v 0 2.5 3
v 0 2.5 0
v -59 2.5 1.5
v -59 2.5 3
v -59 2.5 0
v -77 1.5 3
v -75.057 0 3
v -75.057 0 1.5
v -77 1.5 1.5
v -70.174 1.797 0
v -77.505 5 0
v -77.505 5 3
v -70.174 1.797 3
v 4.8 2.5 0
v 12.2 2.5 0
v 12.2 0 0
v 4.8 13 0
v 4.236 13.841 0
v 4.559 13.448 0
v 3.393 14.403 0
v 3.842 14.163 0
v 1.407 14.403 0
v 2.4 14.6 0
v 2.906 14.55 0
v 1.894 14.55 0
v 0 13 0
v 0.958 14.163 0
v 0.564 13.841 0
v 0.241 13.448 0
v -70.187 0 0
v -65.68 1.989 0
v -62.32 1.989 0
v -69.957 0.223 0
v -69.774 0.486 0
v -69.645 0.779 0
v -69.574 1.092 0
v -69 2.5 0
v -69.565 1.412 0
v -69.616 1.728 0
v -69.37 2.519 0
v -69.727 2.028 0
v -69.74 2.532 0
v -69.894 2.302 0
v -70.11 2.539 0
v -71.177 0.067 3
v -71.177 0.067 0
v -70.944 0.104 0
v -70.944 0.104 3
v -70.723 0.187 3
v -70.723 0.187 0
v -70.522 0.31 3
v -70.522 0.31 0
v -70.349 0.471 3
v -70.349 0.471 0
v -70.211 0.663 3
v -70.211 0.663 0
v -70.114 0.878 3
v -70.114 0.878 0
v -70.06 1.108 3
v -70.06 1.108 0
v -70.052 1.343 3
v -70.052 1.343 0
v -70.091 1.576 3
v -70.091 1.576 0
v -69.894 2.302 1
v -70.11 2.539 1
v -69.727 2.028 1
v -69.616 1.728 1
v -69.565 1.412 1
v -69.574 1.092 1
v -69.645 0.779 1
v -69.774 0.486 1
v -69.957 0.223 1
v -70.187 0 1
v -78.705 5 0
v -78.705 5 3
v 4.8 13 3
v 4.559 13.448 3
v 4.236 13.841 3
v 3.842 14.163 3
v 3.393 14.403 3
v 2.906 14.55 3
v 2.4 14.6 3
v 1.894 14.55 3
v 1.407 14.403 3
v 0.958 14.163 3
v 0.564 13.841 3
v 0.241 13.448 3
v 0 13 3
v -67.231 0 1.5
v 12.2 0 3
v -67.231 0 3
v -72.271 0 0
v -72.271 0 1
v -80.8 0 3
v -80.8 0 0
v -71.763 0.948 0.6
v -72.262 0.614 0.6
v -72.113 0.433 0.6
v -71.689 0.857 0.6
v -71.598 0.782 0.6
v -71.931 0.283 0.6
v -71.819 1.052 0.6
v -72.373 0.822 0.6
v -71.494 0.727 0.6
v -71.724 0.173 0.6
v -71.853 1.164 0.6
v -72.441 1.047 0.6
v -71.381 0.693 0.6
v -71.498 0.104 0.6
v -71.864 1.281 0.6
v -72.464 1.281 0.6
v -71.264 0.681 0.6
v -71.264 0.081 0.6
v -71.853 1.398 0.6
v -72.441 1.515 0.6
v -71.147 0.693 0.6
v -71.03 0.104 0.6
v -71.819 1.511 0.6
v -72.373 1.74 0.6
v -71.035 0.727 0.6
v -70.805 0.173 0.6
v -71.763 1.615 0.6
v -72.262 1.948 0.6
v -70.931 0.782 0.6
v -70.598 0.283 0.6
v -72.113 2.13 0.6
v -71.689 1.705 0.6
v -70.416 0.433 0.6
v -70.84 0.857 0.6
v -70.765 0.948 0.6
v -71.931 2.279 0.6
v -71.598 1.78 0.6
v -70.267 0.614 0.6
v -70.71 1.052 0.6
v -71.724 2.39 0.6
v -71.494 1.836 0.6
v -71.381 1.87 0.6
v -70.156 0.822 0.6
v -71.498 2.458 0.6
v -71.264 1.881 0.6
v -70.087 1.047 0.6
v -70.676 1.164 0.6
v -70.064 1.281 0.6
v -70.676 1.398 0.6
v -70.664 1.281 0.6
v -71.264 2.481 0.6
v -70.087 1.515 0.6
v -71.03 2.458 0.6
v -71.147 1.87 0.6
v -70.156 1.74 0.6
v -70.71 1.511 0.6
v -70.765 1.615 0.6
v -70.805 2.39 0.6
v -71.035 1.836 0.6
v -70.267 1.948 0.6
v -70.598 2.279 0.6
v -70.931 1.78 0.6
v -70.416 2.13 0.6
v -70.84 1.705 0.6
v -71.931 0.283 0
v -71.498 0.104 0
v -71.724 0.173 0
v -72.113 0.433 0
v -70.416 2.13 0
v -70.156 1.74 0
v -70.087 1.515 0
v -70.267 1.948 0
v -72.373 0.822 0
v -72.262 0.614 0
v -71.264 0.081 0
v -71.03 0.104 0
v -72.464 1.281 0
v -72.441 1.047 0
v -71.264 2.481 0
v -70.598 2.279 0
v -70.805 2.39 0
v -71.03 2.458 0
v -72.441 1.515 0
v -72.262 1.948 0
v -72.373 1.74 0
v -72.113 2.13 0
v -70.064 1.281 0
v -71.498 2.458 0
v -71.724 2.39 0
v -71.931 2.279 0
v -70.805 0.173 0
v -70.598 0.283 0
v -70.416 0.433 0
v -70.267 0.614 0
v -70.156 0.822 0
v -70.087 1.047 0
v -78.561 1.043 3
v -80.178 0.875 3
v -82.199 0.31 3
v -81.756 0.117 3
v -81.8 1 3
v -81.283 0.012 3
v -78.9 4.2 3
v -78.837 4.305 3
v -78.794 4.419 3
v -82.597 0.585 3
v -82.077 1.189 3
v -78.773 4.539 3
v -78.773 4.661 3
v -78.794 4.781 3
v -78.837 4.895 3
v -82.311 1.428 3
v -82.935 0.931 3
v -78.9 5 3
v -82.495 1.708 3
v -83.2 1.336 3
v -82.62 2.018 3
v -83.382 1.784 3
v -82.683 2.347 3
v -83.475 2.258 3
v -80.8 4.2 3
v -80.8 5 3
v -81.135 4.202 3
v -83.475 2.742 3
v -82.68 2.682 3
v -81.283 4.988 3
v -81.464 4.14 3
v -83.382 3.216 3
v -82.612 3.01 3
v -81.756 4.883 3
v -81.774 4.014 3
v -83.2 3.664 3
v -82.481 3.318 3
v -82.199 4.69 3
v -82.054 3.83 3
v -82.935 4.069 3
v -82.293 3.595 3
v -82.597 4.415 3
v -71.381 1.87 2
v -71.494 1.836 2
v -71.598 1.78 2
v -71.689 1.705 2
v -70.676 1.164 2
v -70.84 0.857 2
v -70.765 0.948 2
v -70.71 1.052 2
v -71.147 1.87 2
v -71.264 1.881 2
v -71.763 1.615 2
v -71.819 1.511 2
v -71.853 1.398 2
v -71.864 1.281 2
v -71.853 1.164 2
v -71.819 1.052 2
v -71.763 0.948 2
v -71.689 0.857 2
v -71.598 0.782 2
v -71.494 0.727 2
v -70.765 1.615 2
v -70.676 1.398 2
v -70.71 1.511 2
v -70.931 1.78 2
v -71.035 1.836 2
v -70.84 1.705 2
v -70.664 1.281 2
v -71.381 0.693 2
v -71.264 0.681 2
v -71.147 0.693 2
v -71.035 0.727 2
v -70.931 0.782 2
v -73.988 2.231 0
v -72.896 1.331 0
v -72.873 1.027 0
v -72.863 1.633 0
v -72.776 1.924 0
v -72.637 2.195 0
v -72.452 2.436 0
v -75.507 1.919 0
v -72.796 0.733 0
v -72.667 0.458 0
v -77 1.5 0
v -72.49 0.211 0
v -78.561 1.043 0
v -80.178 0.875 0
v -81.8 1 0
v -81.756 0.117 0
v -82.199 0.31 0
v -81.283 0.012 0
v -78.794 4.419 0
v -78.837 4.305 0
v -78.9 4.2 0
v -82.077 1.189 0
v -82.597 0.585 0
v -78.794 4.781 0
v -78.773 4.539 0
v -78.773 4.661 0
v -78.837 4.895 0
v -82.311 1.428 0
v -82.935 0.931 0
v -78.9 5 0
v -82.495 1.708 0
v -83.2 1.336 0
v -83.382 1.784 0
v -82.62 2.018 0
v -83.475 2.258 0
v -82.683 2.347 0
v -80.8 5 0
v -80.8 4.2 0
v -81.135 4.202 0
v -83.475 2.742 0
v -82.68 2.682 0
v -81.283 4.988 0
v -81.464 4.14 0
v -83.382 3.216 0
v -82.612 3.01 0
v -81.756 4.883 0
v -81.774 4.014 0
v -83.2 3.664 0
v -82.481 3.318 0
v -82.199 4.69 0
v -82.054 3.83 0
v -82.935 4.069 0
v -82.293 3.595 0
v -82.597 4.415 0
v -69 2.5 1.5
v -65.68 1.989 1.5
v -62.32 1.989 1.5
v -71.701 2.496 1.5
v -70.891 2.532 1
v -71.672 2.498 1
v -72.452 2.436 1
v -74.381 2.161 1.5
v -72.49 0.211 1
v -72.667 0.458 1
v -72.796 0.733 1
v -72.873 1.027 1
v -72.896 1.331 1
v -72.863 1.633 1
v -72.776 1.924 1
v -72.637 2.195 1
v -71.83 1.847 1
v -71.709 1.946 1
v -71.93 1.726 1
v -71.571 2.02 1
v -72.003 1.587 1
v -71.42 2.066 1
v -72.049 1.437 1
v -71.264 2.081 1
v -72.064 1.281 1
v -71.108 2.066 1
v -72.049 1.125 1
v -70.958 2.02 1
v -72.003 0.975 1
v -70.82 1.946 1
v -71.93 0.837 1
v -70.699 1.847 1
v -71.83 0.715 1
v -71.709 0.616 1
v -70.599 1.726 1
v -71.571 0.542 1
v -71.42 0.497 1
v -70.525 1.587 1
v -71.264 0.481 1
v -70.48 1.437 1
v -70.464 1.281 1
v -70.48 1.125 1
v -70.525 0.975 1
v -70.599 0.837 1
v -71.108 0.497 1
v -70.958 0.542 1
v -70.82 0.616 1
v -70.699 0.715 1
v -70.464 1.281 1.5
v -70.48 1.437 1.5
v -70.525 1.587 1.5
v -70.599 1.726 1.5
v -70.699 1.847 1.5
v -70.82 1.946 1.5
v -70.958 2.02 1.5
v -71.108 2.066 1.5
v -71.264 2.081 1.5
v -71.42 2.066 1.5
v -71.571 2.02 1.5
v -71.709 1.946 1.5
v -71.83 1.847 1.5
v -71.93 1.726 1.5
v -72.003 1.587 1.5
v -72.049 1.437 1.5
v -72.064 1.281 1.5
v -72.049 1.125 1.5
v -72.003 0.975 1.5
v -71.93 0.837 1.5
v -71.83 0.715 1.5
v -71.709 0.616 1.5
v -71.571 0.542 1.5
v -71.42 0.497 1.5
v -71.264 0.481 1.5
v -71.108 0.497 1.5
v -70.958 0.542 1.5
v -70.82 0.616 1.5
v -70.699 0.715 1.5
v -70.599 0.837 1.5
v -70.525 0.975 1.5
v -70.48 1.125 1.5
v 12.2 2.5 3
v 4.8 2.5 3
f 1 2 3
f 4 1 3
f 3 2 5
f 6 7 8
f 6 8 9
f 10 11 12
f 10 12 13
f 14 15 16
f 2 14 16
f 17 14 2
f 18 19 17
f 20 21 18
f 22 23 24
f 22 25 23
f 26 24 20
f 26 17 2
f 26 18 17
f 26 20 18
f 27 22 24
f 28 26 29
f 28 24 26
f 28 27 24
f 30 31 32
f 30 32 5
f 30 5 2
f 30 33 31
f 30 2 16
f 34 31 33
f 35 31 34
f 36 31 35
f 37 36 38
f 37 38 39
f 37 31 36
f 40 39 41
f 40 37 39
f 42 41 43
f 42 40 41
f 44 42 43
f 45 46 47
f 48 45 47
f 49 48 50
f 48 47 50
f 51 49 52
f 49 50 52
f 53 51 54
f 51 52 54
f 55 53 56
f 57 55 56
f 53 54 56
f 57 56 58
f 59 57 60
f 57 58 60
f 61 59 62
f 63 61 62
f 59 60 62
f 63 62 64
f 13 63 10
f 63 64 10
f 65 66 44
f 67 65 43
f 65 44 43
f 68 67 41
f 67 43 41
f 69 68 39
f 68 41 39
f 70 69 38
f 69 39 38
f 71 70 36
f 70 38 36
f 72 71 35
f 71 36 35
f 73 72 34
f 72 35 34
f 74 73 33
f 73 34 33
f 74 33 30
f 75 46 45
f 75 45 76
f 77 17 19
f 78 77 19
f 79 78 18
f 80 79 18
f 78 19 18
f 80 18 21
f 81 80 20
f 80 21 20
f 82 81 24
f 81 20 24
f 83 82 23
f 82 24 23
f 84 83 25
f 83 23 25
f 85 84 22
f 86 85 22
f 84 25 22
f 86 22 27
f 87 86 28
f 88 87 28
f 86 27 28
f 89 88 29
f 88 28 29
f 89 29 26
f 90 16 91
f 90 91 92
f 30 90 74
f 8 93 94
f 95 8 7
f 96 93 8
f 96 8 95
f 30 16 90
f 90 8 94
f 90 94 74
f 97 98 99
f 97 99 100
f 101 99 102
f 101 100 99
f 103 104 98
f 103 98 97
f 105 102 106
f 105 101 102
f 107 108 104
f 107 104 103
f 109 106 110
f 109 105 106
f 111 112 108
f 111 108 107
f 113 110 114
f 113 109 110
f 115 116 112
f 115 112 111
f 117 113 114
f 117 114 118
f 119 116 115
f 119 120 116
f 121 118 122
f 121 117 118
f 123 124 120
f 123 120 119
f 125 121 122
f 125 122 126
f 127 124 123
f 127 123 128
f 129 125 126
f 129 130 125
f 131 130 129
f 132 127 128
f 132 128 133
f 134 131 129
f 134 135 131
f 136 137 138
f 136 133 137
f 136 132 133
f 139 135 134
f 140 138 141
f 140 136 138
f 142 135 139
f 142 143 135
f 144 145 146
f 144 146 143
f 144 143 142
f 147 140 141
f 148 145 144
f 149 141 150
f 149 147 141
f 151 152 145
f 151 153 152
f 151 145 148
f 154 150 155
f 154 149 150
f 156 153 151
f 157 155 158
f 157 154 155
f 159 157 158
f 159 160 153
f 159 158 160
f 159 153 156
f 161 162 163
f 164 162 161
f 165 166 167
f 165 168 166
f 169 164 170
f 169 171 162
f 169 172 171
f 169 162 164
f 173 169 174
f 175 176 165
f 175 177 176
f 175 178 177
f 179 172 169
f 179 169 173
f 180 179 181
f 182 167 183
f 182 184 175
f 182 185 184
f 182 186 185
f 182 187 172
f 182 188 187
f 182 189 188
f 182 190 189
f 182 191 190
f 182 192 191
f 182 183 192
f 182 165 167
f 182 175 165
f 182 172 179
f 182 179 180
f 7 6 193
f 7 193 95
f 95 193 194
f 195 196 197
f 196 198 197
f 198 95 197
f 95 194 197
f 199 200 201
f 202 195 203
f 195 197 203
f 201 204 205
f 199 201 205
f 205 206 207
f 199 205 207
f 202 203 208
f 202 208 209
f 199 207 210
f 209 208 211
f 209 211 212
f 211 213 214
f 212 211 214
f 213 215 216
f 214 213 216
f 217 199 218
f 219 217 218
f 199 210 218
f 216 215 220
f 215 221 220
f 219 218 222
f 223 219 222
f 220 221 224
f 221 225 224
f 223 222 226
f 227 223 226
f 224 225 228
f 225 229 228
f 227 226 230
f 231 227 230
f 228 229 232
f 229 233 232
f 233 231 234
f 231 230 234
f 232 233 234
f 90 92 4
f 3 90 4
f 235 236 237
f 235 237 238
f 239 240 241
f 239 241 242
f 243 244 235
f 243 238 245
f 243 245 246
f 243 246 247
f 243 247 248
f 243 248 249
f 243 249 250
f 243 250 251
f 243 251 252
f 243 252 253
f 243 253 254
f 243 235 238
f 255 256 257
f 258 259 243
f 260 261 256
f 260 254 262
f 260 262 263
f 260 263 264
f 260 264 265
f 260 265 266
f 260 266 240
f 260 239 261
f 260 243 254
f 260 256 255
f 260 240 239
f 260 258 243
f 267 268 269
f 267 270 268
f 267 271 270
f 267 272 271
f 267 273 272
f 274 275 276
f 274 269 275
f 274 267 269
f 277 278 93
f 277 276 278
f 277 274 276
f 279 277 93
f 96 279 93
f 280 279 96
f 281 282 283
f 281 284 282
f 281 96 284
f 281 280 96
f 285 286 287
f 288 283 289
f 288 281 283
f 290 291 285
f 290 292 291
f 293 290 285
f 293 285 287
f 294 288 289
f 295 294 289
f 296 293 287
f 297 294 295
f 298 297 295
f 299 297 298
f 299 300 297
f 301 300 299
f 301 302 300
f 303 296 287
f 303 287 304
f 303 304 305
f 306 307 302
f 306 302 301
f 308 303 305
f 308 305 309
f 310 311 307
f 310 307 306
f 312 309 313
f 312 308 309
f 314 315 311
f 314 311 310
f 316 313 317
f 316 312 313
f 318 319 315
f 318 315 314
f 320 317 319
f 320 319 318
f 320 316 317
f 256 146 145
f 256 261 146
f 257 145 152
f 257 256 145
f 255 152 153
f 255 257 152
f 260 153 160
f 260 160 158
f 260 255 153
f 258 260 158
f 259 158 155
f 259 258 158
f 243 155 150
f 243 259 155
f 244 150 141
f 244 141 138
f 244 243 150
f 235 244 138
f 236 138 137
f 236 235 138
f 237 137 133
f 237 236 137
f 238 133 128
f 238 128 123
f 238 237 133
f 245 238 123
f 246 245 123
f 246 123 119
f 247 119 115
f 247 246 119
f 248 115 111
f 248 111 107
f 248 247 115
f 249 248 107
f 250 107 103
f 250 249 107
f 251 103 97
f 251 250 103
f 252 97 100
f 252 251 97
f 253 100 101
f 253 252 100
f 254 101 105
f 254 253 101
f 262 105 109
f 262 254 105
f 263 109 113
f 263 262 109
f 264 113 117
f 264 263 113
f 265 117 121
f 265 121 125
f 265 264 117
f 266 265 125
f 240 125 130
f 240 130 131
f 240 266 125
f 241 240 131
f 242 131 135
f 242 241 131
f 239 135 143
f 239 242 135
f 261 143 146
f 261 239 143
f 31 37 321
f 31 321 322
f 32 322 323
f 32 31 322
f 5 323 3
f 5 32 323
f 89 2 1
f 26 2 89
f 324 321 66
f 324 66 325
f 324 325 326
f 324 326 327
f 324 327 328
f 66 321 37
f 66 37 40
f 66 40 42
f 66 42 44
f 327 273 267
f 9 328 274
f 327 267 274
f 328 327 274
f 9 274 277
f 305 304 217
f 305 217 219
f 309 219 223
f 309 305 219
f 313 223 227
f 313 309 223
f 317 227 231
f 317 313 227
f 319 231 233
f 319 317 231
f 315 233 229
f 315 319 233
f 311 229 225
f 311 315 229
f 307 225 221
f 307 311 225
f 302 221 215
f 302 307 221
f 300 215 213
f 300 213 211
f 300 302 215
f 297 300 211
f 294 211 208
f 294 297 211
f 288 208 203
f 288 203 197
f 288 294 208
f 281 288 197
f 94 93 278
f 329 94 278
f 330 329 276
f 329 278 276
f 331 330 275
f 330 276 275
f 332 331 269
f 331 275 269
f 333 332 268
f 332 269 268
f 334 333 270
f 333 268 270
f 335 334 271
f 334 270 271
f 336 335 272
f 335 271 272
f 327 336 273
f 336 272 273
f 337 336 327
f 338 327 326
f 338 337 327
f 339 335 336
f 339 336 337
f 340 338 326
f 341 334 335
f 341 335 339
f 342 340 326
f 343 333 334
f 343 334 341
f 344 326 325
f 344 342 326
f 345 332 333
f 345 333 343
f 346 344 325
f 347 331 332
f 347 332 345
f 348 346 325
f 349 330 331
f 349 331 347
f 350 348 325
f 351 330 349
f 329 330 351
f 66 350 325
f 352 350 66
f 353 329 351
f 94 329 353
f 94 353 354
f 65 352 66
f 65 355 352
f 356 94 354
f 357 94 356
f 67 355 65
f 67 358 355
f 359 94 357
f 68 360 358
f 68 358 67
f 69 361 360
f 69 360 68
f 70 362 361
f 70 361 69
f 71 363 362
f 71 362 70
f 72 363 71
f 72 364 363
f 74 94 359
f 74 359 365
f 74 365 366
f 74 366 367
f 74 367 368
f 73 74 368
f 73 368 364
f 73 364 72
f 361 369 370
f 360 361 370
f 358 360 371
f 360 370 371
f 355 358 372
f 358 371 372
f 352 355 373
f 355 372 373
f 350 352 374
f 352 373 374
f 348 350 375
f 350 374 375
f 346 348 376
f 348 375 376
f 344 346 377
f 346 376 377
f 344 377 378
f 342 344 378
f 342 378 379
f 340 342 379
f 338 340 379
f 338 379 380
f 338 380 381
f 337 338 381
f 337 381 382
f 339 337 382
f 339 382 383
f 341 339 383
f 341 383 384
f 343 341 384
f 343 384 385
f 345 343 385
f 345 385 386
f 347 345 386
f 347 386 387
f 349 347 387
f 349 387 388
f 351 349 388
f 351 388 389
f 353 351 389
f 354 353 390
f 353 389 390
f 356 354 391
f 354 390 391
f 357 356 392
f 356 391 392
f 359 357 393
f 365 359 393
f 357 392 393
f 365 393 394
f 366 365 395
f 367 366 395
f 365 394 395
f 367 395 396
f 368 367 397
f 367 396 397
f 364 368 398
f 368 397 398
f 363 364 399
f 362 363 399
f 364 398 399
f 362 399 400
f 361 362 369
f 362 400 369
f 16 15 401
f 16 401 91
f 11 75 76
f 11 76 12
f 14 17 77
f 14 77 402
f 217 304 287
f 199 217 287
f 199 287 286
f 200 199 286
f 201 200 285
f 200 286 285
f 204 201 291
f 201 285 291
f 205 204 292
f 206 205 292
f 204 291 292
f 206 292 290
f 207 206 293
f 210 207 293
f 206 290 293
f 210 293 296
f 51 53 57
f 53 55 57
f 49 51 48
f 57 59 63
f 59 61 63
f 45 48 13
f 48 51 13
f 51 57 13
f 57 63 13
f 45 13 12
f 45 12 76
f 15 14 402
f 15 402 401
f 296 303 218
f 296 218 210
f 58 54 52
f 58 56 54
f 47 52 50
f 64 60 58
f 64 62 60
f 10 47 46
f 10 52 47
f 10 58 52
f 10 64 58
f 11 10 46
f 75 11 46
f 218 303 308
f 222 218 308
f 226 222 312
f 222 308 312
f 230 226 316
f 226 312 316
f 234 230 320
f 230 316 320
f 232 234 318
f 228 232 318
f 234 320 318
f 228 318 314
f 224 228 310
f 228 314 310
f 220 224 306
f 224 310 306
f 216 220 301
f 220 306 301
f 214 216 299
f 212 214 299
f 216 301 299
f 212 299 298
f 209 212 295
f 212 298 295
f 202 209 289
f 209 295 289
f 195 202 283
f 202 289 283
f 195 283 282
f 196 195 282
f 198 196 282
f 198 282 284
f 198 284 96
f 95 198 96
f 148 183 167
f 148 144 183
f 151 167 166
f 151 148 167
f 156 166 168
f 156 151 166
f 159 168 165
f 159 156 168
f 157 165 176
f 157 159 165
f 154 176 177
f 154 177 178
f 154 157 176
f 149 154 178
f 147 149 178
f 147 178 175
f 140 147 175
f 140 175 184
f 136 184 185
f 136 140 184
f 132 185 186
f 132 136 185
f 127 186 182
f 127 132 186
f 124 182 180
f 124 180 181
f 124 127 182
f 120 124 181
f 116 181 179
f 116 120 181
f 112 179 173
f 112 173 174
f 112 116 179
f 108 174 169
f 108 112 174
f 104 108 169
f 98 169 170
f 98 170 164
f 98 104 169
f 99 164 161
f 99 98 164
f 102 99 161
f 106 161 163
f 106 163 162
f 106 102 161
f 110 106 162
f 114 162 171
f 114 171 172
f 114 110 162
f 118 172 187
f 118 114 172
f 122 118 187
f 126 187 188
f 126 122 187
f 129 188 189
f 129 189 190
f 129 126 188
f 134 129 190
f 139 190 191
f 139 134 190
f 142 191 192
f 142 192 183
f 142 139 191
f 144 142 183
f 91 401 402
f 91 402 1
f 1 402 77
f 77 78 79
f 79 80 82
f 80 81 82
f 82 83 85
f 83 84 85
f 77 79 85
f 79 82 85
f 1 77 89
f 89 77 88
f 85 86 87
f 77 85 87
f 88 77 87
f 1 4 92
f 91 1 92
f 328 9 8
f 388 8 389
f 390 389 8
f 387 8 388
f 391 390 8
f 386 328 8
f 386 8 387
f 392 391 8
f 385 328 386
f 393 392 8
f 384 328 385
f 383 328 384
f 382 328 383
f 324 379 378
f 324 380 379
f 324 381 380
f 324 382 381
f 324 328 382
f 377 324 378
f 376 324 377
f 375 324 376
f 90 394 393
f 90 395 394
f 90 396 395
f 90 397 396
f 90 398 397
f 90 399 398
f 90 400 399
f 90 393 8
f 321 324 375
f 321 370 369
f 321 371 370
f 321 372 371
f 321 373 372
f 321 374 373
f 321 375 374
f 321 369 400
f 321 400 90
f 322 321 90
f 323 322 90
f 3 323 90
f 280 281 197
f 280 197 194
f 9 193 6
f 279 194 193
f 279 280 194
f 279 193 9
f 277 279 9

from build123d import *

# Parameters (mm, degrees)
PAD_DEPTH       = 3
PAD001_DEPTH    = 3
POCKET_DEPTH    = 1.5
SKETCH002_R     = 0.8
POCKET001_DEPTH = 1.501
SKETCH005_R     = 1.667622
POCKET002_DEPTH = 1
PAD002_DEPTH    = 3


with BuildPart() as revolution:
    # Sketch004 → Revolution (revolve)
    with BuildSketch(Plane(origin=(-71.264366, 1.281179, 0), x_dir=(1, 0, 0), z_dir=(0, -1, 0))):
        Polygon((0, 2), (0, 0), (1.2, 0), (1.2, 0.6), (0.6, 0.6), (0.6, 2), align=None)
    revolve(axis=Axis((-71.264366, 1.281179, 0), (0, 0, 1)))


with BuildPart() as pad:
    # Sketch → Pad (new body)
    with BuildSketch(Plane.XY):
        with BuildLine():
            Line((0, 0), (-80.8, 0))
            ThreePointArc((-80.8, 5), (-83.486472, 2.5), (-80.8, 0))
            Line((-80.8, 5), (-78.9, 5))
            ThreePointArc((-78.9, 4.2), (-78.769945, 4.6), (-78.9, 5))
            Line((-80.8, 4.2), (-78.9, 4.2))
            ThreePointArc((-80.8, 4.2), (-82.611686, 3.009902), (-81.8, 1))
            ThreePointArc((-81.8, 1), (-79.365861, 0.922269), (-77, 1.5))
            ThreePointArc((-69, 2.5), (-73.046199, 2.369595), (-77, 1.5))
            ThreePointArc((-69, 2.5), (-64, 1.924285), (-59, 2.5))
            Line((0, 2.5), (-59, 2.5))
            Line((0, 2.5), (0, 0))
        make_face()
    extrude(amount=PAD_DEPTH)


with BuildPart() as pocket002:
    # Sketch001 → Pad001 (new body)
    with BuildSketch(Plane.XY):
        with BuildLine():
            Line((0, 0), (0, 13))
            ThreePointArc((4.8, 13), (2.4, 14.6), (0, 13))
            Line((4.8, 13), (4.8, 2.5))
            Line((4.8, 2.5), (12.2, 2.5))
            Line((12.2, 2.5), (12.2, 0))
            Line((12.2, 0), (0, 0))
        make_face()
    extrude(amount=PAD001_DEPTH)

    # Fusion: union Pad
    add(pad.part)

    # Sketch003 → Pocket (cut)
    with BuildSketch(Plane.XY.offset(3)):
        with BuildLine():
            Line((-75.057068, 0), (-67.230911, 0))
            Line((-67.230911, 0), (-59, 2.5))
            ThreePointArc((-69, 2.5), (-64, 1.924285), (-59, 2.5))
            ThreePointArc((-69, 2.5), (-73.046199, 2.369595), (-77, 1.5))
            Line((-75.057068, 0), (-77, 1.5))
        make_face()
    extrude(amount=-POCKET_DEPTH, mode=Mode.SUBTRACT)

    # Sketch002 → Pocket001 (cut, through all)
    with BuildSketch(Plane.XY.offset(1.5)):
        with Locations((-71.264366, 1.281179)):
            Circle(SKETCH002_R)
    extrude(amount=-POCKET001_DEPTH, mode=Mode.SUBTRACT)

    # Sketch005 → Pocket002 (cut)
    with BuildSketch(Plane(origin=(0, 0, 0), x_dir=(1, 0, 0), z_dir=(0, 0, -1))):
        with Locations((-71.228622, -1.301967)):
            Circle(SKETCH005_R)
    extrude(amount=-POCKET002_DEPTH, mode=Mode.SUBTRACT)


with BuildPart() as pad002:
    # Sketch006 → Pad002 (new body)
    with BuildSketch(Plane.XY):
        with BuildLine():
            Line((-71.177252, 0.066992), (-78.704896, 5))
            Line((-78.704896, 5), (-77.504896, 5))
            Line((-77.504896, 5), (-70.174011, 1.797168))
            ThreePointArc((-71.177252, 0.066992), (-70.21136, 0.662873), (-70.174011, 1.797168))
        make_face()
    extrude(amount=PAD002_DEPTH)


solid = Compound([revolution.part, pocket002.part, pad002.part])
